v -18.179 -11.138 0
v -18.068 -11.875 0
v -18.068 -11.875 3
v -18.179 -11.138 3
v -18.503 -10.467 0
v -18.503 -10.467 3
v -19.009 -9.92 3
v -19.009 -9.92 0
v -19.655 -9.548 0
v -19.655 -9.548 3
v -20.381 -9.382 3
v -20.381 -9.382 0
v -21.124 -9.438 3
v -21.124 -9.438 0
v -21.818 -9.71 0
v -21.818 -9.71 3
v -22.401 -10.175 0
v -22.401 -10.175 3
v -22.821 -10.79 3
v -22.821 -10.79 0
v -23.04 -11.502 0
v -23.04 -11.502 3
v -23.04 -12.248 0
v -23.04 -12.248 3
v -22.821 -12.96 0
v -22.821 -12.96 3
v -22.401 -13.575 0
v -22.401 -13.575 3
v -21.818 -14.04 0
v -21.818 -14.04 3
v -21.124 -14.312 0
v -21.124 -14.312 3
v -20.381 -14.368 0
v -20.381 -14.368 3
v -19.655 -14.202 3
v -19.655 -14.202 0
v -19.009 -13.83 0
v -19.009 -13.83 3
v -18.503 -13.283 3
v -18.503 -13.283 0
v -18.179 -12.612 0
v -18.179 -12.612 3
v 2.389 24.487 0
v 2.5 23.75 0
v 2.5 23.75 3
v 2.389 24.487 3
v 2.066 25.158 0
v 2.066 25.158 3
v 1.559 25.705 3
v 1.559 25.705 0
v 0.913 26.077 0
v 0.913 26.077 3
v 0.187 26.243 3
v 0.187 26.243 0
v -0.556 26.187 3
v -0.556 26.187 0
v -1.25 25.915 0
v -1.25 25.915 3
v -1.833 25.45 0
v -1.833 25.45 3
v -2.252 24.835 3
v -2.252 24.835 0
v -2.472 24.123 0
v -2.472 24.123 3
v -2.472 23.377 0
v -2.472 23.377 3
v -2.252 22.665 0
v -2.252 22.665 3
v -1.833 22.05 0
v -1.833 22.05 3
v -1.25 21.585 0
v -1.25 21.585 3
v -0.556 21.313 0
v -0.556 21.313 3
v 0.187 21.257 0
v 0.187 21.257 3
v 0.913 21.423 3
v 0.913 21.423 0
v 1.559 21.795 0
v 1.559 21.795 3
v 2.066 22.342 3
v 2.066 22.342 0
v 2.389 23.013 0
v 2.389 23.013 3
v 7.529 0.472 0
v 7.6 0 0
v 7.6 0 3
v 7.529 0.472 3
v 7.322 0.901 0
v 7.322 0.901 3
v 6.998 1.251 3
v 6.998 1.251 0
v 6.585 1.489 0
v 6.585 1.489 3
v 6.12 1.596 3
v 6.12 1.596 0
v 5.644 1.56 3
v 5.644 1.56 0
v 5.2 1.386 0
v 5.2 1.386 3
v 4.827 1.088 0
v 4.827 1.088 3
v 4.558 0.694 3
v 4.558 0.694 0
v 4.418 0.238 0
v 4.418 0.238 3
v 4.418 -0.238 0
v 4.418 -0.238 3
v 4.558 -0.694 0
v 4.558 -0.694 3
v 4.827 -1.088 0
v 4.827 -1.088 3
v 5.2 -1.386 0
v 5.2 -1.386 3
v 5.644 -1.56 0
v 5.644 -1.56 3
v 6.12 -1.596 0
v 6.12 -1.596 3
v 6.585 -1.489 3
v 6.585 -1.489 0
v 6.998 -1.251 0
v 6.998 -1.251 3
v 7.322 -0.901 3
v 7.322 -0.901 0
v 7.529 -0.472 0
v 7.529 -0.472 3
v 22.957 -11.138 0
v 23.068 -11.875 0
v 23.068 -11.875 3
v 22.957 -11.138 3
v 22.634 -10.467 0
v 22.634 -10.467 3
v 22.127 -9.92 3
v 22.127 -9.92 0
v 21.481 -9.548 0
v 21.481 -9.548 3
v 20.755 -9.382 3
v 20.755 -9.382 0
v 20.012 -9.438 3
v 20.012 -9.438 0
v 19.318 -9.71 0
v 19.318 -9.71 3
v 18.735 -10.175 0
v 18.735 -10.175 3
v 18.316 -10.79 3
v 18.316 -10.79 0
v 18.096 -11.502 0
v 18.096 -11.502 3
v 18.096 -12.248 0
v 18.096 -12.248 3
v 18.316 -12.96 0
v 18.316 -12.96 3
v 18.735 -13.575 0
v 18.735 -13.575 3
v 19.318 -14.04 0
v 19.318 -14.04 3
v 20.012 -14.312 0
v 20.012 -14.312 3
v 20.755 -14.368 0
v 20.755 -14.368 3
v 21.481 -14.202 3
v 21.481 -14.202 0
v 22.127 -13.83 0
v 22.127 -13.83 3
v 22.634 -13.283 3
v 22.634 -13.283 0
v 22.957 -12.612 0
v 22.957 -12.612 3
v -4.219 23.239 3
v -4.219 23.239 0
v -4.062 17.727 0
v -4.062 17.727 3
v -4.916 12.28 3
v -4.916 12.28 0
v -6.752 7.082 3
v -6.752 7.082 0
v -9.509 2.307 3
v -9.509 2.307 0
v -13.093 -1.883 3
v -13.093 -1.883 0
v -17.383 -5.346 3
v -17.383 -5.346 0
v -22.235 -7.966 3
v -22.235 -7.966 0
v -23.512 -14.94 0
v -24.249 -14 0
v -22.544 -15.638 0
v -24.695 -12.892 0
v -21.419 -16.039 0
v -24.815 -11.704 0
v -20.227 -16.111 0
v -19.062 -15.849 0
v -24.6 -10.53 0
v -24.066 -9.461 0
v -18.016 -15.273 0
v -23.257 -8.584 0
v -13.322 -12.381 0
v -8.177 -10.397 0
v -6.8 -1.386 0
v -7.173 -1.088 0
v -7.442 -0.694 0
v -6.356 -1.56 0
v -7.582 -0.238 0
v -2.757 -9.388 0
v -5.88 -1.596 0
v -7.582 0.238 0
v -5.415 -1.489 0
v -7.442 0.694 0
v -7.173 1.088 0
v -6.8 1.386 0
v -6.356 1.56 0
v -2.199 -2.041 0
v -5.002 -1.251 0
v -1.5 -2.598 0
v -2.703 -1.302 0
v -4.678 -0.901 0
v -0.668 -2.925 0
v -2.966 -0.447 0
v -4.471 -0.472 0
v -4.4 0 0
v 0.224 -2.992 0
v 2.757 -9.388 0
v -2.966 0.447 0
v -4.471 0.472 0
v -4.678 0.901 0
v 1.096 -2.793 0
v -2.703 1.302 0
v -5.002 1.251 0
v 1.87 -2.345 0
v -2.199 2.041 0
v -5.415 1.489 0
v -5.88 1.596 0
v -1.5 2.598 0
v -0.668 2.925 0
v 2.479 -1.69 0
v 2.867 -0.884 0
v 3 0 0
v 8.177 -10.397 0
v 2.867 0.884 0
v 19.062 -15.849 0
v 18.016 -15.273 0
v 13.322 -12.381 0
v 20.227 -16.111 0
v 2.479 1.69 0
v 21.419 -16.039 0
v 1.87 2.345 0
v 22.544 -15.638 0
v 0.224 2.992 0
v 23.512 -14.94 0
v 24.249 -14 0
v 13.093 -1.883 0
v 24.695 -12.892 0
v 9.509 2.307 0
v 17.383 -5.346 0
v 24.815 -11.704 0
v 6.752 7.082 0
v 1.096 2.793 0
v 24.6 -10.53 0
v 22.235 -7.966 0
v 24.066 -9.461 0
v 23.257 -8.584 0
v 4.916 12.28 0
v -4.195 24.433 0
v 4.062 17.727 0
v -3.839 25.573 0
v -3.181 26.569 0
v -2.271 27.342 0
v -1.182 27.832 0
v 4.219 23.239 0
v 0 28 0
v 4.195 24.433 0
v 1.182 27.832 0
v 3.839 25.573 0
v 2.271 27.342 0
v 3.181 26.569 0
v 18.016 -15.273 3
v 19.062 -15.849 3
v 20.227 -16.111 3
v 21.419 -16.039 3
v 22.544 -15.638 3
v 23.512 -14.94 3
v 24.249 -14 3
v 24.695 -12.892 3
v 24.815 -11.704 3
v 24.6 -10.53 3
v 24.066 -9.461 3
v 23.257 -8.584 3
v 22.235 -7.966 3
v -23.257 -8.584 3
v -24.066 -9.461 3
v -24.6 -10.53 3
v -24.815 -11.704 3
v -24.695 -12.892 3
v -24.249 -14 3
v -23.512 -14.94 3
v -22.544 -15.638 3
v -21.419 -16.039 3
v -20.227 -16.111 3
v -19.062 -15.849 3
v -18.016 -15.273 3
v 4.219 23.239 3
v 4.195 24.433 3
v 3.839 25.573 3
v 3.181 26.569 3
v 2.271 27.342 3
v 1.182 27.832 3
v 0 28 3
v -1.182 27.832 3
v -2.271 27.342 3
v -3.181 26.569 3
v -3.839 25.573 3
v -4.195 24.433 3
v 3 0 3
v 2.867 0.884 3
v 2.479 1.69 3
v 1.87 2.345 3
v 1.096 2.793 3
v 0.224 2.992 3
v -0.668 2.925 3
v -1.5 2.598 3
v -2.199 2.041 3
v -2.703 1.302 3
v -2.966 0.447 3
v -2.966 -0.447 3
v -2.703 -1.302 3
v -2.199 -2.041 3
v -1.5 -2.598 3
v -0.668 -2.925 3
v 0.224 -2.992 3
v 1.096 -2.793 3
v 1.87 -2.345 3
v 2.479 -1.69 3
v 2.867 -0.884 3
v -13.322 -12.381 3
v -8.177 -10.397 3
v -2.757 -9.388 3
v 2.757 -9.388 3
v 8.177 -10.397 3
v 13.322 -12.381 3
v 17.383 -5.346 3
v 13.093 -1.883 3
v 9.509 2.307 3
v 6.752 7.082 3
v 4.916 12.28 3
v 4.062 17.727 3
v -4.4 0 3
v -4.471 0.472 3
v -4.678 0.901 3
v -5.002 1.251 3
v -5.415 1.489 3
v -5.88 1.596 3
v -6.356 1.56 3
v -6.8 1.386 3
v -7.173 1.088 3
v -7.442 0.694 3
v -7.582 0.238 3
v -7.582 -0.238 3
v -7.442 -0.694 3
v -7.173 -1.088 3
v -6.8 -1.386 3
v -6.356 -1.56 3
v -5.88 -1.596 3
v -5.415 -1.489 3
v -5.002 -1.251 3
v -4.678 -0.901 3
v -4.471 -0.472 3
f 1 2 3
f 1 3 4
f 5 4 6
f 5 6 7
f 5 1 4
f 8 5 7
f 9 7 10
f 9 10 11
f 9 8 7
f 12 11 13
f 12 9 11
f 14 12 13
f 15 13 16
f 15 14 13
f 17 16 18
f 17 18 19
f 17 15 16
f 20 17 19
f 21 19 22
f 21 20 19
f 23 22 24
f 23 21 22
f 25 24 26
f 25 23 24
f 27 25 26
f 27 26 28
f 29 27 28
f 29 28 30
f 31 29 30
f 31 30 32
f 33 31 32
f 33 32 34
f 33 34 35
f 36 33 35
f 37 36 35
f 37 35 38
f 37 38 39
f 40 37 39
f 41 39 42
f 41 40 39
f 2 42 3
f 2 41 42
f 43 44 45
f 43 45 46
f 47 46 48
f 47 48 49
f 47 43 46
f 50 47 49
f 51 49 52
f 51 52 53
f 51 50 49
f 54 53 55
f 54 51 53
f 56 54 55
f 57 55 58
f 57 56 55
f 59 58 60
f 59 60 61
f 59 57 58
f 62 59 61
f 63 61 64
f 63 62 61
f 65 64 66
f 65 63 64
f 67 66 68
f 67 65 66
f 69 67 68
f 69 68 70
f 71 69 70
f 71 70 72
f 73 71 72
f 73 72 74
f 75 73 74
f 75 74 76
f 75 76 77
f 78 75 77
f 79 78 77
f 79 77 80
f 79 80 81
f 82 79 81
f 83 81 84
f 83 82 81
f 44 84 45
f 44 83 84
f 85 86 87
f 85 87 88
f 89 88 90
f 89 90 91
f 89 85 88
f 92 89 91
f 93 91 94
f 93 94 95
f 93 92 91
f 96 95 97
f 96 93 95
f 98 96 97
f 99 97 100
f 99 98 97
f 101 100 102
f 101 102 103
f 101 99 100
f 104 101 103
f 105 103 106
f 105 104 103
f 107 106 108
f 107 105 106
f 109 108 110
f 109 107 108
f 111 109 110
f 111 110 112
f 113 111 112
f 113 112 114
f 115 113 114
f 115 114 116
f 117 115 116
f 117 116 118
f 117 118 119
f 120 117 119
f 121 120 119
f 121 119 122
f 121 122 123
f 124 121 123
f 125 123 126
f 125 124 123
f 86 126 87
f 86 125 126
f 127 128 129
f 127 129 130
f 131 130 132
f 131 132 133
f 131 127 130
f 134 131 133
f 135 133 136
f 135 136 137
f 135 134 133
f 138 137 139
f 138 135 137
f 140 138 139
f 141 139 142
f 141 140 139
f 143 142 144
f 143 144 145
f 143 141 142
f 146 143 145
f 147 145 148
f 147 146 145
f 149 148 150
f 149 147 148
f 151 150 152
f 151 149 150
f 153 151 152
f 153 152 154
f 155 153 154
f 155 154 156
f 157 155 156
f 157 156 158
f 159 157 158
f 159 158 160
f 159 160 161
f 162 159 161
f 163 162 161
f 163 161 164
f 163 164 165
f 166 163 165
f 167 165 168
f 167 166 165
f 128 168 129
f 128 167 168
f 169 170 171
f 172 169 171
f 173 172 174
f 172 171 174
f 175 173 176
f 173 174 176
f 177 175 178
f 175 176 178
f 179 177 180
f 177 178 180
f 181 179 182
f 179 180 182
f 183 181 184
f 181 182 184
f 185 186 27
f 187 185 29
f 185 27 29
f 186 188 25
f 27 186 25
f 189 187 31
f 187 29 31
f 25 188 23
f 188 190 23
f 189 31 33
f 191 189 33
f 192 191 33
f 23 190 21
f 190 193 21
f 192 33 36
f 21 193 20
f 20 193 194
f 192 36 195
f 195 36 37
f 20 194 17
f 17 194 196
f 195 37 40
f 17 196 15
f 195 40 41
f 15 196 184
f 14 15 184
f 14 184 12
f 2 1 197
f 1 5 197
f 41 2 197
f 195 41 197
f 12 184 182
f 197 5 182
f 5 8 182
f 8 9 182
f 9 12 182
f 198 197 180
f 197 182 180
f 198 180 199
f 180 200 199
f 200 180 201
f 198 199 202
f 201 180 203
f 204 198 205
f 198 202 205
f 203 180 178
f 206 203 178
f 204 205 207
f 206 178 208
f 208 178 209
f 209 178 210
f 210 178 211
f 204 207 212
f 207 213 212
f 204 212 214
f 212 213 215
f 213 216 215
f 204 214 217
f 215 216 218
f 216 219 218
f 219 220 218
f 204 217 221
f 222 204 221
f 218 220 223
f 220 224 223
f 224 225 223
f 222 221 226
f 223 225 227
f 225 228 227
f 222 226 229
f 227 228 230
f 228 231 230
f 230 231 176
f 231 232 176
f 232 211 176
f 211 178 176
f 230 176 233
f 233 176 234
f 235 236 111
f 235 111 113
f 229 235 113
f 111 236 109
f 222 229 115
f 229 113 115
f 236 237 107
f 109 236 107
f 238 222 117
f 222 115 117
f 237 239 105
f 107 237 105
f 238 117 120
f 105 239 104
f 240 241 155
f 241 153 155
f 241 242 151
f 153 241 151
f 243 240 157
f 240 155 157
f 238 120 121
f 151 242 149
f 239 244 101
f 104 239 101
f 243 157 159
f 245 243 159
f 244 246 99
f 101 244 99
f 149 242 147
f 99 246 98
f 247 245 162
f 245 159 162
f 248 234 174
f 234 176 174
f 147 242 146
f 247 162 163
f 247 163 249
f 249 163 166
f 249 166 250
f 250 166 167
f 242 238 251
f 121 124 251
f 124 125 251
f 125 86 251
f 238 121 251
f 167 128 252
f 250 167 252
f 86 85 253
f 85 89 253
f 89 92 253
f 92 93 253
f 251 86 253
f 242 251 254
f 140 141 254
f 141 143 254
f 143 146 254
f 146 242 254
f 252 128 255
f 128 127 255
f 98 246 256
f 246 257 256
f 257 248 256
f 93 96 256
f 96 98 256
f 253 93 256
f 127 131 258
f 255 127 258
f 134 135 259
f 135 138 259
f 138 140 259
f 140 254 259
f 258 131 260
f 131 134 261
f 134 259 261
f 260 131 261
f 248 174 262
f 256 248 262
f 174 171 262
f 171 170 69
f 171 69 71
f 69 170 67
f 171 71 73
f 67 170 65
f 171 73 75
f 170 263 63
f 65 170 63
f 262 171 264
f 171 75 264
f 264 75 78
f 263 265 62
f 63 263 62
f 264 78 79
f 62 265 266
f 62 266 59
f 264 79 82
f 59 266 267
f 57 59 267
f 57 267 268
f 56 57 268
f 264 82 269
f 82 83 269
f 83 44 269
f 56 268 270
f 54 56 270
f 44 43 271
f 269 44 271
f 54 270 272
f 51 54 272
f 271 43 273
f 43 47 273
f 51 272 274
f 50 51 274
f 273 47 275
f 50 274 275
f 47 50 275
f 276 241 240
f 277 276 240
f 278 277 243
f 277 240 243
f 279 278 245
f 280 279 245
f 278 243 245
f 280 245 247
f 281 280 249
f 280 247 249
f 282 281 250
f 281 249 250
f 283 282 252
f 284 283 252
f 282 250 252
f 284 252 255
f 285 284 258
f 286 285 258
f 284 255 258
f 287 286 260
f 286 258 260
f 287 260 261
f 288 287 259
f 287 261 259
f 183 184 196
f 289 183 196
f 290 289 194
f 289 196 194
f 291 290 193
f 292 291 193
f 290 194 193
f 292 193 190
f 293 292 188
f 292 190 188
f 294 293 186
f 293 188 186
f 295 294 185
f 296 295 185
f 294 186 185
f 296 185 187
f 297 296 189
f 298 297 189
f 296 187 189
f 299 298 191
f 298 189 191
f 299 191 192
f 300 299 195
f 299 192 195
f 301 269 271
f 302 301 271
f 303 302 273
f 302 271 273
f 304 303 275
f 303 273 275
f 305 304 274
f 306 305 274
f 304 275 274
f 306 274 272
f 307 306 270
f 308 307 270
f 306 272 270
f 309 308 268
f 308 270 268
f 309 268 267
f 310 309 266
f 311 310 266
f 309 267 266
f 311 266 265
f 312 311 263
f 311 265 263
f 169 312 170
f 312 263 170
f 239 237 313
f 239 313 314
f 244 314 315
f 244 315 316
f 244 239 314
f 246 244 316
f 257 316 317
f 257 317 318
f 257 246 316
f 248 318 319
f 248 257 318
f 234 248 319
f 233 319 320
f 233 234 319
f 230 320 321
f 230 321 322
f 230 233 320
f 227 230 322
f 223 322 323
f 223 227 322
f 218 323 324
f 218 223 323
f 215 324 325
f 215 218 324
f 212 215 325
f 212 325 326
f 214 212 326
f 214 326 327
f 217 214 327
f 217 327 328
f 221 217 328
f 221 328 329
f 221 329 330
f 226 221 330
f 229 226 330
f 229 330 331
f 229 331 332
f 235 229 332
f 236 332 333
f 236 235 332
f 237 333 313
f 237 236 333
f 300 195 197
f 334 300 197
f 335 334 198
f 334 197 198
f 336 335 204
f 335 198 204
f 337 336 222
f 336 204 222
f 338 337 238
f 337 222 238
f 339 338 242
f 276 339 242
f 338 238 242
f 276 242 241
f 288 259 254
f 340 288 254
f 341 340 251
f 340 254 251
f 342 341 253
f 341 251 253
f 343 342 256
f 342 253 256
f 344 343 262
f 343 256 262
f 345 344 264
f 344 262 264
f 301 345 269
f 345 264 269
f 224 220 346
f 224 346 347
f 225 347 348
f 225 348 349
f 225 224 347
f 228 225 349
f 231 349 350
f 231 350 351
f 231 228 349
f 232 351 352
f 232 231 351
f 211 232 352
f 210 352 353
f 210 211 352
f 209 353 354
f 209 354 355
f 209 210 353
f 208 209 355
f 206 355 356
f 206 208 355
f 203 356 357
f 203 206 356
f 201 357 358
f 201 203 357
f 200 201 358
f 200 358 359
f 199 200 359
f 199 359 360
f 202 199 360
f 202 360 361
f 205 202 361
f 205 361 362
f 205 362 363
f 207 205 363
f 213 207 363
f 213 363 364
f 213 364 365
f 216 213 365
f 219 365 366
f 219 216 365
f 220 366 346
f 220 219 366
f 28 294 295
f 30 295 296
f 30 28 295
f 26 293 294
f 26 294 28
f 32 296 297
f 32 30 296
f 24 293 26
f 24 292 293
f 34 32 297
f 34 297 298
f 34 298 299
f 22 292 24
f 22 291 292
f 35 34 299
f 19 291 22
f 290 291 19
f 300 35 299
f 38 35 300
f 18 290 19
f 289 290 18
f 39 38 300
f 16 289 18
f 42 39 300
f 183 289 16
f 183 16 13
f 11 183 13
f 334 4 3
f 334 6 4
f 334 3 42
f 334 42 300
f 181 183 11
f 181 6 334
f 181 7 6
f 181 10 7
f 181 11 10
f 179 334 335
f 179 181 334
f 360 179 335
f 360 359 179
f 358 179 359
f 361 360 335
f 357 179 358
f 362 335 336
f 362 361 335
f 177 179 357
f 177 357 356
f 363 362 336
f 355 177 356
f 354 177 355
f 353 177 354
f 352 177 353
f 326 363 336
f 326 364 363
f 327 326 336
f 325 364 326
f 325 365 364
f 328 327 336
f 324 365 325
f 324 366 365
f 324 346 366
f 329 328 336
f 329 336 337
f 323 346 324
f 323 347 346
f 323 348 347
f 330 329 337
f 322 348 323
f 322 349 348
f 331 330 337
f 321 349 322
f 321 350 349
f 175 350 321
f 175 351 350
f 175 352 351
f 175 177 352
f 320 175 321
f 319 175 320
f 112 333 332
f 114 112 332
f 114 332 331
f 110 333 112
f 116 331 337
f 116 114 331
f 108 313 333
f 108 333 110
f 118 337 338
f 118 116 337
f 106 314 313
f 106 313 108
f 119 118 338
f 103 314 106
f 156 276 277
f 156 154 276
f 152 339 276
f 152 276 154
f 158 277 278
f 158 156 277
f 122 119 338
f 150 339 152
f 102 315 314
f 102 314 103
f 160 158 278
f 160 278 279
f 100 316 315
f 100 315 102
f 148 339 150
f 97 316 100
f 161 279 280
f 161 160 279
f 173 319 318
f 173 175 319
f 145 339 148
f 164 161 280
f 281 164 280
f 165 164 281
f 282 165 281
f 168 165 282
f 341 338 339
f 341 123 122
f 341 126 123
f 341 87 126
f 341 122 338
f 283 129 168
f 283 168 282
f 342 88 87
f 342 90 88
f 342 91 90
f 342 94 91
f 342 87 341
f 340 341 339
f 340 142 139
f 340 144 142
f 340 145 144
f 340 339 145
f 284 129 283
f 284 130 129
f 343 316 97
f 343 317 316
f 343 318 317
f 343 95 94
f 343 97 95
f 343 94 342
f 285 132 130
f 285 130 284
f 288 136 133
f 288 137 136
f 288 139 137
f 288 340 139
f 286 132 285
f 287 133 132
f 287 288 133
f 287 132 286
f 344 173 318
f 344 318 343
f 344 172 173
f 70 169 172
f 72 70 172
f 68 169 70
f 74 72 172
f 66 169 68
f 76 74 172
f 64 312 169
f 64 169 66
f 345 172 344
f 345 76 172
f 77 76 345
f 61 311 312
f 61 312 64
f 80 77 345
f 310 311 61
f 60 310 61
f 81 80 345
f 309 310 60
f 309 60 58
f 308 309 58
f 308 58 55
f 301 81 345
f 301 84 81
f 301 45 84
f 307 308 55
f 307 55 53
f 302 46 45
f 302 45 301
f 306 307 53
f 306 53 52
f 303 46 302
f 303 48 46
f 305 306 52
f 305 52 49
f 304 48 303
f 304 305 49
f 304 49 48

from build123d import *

# Parameters (mm, degrees)
SKETCH_1_R      = 2.5
SKETCH_1_R_2    = 3
SKETCH_1_R_3    = 1.6
EXTRUDE_1_DEPTH = 3


with BuildPart() as part:
    # ｽｹｯﾁ1 → ﾎﾞｽ - 押し出し1 (new body)
    with BuildSketch(Plane.XY):
        with BuildLine():
            ThreePointArc((-22.235006429, -7.965532761), (-24.248711306, -14), (-18.01585694, -15.27331404))
            ThreePointArc((-18.01585694, -15.27331404), (0, -9.261413146), (18.01585694, -15.27331404))
            ThreePointArc((18.01585694, -15.27331404), (24.248711306, -14), (22.235006429, -7.965532761))
            ThreePointArc((22.235006429, -7.965532761), (8.020619059, 4.630706573), (4.219149489, 23.238846801))
            ThreePointArc((4.219149489, 23.238846801), (0, 28), (-4.219149489, 23.238846801))
            ThreePointArc((-4.219149489, 23.238846801), (-8.020619059, 4.630706573), (-22.235006429, -7.965532761))
        make_face()
        with Locations((0, 23.75)):
            Circle(SKETCH_1_R, mode=Mode.SUBTRACT)
        Circle(SKETCH_1_R_2, mode=Mode.SUBTRACT)
        with Locations((-6, 0)):
            Circle(SKETCH_1_R_3, mode=Mode.SUBTRACT)
        with Locations((6, 0)):
            Circle(SKETCH_1_R_3, mode=Mode.SUBTRACT)
        with Locations((20.56810334, -11.875)):
            Circle(SKETCH_1_R, mode=Mode.SUBTRACT)
        with Locations((-20.56810334, -11.875)):
            Circle(SKETCH_1_R, mode=Mode.SUBTRACT)
    extrude(amount=EXTRUDE_1_DEPTH)


solid = part.part
